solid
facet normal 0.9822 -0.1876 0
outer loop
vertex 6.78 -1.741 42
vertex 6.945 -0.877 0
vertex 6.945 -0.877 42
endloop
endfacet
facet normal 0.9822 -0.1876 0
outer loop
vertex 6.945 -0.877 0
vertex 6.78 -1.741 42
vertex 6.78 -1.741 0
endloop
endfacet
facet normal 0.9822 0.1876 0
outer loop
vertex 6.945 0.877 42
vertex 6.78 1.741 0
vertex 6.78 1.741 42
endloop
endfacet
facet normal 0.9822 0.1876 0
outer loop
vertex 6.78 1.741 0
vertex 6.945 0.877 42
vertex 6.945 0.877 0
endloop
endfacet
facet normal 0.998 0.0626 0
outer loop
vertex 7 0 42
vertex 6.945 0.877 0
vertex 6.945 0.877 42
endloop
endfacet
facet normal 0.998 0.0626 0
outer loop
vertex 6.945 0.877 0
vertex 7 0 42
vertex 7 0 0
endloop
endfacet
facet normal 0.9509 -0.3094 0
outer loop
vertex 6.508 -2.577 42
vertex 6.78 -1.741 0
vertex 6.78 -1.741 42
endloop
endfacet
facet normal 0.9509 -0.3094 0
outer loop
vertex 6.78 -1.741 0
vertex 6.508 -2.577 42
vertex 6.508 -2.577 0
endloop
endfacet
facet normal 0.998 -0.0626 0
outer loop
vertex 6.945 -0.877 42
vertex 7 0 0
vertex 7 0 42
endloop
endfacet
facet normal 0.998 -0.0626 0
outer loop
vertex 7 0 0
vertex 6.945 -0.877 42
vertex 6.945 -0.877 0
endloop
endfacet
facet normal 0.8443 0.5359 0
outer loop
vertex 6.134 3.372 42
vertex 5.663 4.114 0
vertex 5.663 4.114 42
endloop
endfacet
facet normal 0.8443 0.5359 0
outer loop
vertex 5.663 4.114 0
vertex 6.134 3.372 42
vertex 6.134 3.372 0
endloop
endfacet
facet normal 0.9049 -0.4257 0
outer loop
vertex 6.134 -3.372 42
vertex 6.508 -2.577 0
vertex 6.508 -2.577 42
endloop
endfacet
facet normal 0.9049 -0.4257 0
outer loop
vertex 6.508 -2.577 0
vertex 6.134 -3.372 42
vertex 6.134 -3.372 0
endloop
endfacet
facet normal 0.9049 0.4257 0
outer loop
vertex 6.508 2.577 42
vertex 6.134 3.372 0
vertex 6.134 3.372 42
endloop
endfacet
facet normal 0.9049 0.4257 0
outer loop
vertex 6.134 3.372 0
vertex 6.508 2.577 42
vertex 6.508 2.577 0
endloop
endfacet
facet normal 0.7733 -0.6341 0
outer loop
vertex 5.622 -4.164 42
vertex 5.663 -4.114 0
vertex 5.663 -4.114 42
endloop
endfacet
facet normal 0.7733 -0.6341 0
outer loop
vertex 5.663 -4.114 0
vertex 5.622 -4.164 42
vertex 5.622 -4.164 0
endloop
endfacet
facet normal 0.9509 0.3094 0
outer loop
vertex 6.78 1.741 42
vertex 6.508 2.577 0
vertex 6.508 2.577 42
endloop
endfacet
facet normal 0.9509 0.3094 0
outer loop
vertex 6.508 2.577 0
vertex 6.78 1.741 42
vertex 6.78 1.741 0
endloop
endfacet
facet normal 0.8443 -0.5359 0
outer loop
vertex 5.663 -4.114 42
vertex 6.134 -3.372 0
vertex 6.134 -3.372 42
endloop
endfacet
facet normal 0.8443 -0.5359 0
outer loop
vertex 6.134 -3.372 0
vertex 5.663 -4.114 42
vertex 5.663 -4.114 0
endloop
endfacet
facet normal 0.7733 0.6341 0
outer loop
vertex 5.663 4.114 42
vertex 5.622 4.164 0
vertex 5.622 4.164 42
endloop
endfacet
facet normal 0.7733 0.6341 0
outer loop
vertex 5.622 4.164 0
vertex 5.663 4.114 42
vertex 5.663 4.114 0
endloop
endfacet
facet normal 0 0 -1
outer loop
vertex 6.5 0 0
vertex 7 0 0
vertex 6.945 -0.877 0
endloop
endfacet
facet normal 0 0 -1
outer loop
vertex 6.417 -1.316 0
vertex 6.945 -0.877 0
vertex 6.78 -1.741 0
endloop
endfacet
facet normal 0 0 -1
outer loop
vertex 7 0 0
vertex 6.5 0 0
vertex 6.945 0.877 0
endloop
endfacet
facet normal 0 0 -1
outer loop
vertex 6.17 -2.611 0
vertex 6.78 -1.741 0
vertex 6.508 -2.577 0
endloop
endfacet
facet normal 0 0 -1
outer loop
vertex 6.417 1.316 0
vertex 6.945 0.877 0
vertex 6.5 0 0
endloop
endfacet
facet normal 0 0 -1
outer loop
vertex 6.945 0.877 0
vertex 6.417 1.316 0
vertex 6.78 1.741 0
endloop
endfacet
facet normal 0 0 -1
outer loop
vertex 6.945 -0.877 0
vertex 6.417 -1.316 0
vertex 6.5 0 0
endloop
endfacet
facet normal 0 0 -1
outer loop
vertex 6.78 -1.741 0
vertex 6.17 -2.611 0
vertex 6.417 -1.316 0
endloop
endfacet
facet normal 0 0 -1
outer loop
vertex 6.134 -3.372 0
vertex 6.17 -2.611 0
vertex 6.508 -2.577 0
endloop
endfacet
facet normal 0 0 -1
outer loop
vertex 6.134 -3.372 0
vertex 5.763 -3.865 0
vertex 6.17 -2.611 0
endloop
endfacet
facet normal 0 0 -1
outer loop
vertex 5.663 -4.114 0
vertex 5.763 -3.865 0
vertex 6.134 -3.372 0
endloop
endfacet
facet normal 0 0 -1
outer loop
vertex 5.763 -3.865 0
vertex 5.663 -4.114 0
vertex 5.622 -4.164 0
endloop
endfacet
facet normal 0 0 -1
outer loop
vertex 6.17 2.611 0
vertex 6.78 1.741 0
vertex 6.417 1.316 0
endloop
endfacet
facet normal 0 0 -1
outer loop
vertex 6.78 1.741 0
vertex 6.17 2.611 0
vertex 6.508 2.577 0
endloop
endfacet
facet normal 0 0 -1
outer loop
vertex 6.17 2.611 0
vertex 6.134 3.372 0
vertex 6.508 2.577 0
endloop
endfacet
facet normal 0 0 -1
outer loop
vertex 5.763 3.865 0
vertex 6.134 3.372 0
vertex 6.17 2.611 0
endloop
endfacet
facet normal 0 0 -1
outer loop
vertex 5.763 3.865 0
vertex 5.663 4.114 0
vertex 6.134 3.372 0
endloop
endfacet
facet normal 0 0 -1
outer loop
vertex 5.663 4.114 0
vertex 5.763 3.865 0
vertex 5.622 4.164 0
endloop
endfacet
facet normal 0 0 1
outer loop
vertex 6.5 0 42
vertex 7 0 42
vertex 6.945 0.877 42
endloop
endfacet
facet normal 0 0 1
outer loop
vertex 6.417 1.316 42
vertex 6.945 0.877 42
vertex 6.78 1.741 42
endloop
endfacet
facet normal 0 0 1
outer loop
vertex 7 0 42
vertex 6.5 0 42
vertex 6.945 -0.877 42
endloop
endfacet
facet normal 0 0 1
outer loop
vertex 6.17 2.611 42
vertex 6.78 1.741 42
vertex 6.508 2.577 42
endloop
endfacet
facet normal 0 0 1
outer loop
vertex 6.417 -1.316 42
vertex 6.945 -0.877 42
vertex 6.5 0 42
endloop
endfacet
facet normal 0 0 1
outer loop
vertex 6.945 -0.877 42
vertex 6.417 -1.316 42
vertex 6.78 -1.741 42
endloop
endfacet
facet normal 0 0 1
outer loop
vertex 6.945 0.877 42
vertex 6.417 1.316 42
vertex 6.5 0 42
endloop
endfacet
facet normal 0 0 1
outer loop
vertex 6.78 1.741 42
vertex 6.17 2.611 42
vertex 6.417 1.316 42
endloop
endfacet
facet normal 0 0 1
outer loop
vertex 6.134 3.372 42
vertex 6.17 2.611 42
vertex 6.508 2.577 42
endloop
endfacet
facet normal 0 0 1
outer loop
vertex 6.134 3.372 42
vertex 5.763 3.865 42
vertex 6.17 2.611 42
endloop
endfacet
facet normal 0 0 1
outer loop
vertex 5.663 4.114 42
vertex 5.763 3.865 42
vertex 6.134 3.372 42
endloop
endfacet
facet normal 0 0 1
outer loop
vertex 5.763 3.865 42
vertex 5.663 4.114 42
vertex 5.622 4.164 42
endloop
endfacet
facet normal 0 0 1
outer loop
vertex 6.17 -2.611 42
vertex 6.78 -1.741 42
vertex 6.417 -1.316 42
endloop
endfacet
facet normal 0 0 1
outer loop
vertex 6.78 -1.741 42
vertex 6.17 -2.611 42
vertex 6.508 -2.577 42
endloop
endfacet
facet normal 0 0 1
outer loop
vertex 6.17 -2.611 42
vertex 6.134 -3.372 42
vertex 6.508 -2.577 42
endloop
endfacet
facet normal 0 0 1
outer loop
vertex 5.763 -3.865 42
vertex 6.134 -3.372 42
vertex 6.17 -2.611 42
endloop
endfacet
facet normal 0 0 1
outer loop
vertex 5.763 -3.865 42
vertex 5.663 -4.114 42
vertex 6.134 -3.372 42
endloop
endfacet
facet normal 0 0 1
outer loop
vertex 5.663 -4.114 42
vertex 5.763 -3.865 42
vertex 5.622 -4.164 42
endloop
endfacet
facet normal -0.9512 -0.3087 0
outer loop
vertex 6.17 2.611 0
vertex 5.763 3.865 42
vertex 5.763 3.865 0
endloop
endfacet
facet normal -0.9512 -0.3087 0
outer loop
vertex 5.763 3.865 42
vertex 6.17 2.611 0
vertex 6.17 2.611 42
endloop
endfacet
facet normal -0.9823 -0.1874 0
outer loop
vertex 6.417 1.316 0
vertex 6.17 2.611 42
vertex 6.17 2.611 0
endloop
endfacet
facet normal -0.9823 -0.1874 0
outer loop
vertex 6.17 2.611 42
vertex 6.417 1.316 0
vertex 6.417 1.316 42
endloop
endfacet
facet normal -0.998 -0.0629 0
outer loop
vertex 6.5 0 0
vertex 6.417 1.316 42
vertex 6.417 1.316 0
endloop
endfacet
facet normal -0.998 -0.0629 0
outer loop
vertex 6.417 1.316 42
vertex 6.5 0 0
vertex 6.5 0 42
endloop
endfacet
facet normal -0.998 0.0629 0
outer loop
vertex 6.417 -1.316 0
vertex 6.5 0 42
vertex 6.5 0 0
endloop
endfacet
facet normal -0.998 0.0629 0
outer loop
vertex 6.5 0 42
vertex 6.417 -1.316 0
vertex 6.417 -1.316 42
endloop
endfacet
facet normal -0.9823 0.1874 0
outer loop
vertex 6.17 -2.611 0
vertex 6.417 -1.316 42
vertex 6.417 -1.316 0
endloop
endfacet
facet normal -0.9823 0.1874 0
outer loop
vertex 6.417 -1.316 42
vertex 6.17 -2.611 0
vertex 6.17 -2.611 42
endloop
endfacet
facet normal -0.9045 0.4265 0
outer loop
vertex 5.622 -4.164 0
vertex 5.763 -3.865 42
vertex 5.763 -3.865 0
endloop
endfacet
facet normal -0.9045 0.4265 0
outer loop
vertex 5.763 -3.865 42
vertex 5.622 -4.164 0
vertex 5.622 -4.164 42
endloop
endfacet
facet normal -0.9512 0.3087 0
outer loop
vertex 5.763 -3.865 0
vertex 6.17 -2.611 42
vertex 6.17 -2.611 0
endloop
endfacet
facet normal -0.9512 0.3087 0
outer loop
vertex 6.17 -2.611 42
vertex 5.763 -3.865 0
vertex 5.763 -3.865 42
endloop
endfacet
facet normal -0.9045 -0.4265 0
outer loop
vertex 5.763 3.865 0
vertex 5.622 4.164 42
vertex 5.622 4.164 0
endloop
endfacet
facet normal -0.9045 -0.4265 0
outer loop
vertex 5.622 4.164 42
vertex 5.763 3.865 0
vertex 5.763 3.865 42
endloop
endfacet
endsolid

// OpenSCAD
$fn = 50;


difference() {
	union() {
		cylinder(h = 42, r = 7.0000000000);
		translate(v = [-7.0000000000, 0, 0]) {
			cylinder(h = 42, r = 7.0000000000);
		}
	}
	union() {
		cylinder(h = 42, r = 3.2500000000);
		cylinder(h = 42, r = 1.8000000000);
		cylinder(h = 42, r = 1.8000000000);
		cylinder(h = 42, r = 1.8000000000);
		translate(v = [-11.5000000000, 0, 0]) {
			hull() {
				translate(v = [-3.7500000000, 0.0000000000, 0]) {
					cylinder(h = 42, r = 7.5000000000);
				}
				translate(v = [3.7500000000, 0.0000000000, 0]) {
					cylinder(h = 42, r = 7.5000000000);
				}
				translate(v = [-3.7500000000, -0.0000000000, 0]) {
					cylinder(h = 42, r = 7.5000000000);
				}
				translate(v = [3.7500000000, -0.0000000000, 0]) {
					cylinder(h = 42, r = 7.5000000000);
				}
			}
		}
		translate(v = [-4.0000000000, 0, 0.0000000000]) {
			cylinder(h = 42, r = 10.5000000000);
		}
	}
}
